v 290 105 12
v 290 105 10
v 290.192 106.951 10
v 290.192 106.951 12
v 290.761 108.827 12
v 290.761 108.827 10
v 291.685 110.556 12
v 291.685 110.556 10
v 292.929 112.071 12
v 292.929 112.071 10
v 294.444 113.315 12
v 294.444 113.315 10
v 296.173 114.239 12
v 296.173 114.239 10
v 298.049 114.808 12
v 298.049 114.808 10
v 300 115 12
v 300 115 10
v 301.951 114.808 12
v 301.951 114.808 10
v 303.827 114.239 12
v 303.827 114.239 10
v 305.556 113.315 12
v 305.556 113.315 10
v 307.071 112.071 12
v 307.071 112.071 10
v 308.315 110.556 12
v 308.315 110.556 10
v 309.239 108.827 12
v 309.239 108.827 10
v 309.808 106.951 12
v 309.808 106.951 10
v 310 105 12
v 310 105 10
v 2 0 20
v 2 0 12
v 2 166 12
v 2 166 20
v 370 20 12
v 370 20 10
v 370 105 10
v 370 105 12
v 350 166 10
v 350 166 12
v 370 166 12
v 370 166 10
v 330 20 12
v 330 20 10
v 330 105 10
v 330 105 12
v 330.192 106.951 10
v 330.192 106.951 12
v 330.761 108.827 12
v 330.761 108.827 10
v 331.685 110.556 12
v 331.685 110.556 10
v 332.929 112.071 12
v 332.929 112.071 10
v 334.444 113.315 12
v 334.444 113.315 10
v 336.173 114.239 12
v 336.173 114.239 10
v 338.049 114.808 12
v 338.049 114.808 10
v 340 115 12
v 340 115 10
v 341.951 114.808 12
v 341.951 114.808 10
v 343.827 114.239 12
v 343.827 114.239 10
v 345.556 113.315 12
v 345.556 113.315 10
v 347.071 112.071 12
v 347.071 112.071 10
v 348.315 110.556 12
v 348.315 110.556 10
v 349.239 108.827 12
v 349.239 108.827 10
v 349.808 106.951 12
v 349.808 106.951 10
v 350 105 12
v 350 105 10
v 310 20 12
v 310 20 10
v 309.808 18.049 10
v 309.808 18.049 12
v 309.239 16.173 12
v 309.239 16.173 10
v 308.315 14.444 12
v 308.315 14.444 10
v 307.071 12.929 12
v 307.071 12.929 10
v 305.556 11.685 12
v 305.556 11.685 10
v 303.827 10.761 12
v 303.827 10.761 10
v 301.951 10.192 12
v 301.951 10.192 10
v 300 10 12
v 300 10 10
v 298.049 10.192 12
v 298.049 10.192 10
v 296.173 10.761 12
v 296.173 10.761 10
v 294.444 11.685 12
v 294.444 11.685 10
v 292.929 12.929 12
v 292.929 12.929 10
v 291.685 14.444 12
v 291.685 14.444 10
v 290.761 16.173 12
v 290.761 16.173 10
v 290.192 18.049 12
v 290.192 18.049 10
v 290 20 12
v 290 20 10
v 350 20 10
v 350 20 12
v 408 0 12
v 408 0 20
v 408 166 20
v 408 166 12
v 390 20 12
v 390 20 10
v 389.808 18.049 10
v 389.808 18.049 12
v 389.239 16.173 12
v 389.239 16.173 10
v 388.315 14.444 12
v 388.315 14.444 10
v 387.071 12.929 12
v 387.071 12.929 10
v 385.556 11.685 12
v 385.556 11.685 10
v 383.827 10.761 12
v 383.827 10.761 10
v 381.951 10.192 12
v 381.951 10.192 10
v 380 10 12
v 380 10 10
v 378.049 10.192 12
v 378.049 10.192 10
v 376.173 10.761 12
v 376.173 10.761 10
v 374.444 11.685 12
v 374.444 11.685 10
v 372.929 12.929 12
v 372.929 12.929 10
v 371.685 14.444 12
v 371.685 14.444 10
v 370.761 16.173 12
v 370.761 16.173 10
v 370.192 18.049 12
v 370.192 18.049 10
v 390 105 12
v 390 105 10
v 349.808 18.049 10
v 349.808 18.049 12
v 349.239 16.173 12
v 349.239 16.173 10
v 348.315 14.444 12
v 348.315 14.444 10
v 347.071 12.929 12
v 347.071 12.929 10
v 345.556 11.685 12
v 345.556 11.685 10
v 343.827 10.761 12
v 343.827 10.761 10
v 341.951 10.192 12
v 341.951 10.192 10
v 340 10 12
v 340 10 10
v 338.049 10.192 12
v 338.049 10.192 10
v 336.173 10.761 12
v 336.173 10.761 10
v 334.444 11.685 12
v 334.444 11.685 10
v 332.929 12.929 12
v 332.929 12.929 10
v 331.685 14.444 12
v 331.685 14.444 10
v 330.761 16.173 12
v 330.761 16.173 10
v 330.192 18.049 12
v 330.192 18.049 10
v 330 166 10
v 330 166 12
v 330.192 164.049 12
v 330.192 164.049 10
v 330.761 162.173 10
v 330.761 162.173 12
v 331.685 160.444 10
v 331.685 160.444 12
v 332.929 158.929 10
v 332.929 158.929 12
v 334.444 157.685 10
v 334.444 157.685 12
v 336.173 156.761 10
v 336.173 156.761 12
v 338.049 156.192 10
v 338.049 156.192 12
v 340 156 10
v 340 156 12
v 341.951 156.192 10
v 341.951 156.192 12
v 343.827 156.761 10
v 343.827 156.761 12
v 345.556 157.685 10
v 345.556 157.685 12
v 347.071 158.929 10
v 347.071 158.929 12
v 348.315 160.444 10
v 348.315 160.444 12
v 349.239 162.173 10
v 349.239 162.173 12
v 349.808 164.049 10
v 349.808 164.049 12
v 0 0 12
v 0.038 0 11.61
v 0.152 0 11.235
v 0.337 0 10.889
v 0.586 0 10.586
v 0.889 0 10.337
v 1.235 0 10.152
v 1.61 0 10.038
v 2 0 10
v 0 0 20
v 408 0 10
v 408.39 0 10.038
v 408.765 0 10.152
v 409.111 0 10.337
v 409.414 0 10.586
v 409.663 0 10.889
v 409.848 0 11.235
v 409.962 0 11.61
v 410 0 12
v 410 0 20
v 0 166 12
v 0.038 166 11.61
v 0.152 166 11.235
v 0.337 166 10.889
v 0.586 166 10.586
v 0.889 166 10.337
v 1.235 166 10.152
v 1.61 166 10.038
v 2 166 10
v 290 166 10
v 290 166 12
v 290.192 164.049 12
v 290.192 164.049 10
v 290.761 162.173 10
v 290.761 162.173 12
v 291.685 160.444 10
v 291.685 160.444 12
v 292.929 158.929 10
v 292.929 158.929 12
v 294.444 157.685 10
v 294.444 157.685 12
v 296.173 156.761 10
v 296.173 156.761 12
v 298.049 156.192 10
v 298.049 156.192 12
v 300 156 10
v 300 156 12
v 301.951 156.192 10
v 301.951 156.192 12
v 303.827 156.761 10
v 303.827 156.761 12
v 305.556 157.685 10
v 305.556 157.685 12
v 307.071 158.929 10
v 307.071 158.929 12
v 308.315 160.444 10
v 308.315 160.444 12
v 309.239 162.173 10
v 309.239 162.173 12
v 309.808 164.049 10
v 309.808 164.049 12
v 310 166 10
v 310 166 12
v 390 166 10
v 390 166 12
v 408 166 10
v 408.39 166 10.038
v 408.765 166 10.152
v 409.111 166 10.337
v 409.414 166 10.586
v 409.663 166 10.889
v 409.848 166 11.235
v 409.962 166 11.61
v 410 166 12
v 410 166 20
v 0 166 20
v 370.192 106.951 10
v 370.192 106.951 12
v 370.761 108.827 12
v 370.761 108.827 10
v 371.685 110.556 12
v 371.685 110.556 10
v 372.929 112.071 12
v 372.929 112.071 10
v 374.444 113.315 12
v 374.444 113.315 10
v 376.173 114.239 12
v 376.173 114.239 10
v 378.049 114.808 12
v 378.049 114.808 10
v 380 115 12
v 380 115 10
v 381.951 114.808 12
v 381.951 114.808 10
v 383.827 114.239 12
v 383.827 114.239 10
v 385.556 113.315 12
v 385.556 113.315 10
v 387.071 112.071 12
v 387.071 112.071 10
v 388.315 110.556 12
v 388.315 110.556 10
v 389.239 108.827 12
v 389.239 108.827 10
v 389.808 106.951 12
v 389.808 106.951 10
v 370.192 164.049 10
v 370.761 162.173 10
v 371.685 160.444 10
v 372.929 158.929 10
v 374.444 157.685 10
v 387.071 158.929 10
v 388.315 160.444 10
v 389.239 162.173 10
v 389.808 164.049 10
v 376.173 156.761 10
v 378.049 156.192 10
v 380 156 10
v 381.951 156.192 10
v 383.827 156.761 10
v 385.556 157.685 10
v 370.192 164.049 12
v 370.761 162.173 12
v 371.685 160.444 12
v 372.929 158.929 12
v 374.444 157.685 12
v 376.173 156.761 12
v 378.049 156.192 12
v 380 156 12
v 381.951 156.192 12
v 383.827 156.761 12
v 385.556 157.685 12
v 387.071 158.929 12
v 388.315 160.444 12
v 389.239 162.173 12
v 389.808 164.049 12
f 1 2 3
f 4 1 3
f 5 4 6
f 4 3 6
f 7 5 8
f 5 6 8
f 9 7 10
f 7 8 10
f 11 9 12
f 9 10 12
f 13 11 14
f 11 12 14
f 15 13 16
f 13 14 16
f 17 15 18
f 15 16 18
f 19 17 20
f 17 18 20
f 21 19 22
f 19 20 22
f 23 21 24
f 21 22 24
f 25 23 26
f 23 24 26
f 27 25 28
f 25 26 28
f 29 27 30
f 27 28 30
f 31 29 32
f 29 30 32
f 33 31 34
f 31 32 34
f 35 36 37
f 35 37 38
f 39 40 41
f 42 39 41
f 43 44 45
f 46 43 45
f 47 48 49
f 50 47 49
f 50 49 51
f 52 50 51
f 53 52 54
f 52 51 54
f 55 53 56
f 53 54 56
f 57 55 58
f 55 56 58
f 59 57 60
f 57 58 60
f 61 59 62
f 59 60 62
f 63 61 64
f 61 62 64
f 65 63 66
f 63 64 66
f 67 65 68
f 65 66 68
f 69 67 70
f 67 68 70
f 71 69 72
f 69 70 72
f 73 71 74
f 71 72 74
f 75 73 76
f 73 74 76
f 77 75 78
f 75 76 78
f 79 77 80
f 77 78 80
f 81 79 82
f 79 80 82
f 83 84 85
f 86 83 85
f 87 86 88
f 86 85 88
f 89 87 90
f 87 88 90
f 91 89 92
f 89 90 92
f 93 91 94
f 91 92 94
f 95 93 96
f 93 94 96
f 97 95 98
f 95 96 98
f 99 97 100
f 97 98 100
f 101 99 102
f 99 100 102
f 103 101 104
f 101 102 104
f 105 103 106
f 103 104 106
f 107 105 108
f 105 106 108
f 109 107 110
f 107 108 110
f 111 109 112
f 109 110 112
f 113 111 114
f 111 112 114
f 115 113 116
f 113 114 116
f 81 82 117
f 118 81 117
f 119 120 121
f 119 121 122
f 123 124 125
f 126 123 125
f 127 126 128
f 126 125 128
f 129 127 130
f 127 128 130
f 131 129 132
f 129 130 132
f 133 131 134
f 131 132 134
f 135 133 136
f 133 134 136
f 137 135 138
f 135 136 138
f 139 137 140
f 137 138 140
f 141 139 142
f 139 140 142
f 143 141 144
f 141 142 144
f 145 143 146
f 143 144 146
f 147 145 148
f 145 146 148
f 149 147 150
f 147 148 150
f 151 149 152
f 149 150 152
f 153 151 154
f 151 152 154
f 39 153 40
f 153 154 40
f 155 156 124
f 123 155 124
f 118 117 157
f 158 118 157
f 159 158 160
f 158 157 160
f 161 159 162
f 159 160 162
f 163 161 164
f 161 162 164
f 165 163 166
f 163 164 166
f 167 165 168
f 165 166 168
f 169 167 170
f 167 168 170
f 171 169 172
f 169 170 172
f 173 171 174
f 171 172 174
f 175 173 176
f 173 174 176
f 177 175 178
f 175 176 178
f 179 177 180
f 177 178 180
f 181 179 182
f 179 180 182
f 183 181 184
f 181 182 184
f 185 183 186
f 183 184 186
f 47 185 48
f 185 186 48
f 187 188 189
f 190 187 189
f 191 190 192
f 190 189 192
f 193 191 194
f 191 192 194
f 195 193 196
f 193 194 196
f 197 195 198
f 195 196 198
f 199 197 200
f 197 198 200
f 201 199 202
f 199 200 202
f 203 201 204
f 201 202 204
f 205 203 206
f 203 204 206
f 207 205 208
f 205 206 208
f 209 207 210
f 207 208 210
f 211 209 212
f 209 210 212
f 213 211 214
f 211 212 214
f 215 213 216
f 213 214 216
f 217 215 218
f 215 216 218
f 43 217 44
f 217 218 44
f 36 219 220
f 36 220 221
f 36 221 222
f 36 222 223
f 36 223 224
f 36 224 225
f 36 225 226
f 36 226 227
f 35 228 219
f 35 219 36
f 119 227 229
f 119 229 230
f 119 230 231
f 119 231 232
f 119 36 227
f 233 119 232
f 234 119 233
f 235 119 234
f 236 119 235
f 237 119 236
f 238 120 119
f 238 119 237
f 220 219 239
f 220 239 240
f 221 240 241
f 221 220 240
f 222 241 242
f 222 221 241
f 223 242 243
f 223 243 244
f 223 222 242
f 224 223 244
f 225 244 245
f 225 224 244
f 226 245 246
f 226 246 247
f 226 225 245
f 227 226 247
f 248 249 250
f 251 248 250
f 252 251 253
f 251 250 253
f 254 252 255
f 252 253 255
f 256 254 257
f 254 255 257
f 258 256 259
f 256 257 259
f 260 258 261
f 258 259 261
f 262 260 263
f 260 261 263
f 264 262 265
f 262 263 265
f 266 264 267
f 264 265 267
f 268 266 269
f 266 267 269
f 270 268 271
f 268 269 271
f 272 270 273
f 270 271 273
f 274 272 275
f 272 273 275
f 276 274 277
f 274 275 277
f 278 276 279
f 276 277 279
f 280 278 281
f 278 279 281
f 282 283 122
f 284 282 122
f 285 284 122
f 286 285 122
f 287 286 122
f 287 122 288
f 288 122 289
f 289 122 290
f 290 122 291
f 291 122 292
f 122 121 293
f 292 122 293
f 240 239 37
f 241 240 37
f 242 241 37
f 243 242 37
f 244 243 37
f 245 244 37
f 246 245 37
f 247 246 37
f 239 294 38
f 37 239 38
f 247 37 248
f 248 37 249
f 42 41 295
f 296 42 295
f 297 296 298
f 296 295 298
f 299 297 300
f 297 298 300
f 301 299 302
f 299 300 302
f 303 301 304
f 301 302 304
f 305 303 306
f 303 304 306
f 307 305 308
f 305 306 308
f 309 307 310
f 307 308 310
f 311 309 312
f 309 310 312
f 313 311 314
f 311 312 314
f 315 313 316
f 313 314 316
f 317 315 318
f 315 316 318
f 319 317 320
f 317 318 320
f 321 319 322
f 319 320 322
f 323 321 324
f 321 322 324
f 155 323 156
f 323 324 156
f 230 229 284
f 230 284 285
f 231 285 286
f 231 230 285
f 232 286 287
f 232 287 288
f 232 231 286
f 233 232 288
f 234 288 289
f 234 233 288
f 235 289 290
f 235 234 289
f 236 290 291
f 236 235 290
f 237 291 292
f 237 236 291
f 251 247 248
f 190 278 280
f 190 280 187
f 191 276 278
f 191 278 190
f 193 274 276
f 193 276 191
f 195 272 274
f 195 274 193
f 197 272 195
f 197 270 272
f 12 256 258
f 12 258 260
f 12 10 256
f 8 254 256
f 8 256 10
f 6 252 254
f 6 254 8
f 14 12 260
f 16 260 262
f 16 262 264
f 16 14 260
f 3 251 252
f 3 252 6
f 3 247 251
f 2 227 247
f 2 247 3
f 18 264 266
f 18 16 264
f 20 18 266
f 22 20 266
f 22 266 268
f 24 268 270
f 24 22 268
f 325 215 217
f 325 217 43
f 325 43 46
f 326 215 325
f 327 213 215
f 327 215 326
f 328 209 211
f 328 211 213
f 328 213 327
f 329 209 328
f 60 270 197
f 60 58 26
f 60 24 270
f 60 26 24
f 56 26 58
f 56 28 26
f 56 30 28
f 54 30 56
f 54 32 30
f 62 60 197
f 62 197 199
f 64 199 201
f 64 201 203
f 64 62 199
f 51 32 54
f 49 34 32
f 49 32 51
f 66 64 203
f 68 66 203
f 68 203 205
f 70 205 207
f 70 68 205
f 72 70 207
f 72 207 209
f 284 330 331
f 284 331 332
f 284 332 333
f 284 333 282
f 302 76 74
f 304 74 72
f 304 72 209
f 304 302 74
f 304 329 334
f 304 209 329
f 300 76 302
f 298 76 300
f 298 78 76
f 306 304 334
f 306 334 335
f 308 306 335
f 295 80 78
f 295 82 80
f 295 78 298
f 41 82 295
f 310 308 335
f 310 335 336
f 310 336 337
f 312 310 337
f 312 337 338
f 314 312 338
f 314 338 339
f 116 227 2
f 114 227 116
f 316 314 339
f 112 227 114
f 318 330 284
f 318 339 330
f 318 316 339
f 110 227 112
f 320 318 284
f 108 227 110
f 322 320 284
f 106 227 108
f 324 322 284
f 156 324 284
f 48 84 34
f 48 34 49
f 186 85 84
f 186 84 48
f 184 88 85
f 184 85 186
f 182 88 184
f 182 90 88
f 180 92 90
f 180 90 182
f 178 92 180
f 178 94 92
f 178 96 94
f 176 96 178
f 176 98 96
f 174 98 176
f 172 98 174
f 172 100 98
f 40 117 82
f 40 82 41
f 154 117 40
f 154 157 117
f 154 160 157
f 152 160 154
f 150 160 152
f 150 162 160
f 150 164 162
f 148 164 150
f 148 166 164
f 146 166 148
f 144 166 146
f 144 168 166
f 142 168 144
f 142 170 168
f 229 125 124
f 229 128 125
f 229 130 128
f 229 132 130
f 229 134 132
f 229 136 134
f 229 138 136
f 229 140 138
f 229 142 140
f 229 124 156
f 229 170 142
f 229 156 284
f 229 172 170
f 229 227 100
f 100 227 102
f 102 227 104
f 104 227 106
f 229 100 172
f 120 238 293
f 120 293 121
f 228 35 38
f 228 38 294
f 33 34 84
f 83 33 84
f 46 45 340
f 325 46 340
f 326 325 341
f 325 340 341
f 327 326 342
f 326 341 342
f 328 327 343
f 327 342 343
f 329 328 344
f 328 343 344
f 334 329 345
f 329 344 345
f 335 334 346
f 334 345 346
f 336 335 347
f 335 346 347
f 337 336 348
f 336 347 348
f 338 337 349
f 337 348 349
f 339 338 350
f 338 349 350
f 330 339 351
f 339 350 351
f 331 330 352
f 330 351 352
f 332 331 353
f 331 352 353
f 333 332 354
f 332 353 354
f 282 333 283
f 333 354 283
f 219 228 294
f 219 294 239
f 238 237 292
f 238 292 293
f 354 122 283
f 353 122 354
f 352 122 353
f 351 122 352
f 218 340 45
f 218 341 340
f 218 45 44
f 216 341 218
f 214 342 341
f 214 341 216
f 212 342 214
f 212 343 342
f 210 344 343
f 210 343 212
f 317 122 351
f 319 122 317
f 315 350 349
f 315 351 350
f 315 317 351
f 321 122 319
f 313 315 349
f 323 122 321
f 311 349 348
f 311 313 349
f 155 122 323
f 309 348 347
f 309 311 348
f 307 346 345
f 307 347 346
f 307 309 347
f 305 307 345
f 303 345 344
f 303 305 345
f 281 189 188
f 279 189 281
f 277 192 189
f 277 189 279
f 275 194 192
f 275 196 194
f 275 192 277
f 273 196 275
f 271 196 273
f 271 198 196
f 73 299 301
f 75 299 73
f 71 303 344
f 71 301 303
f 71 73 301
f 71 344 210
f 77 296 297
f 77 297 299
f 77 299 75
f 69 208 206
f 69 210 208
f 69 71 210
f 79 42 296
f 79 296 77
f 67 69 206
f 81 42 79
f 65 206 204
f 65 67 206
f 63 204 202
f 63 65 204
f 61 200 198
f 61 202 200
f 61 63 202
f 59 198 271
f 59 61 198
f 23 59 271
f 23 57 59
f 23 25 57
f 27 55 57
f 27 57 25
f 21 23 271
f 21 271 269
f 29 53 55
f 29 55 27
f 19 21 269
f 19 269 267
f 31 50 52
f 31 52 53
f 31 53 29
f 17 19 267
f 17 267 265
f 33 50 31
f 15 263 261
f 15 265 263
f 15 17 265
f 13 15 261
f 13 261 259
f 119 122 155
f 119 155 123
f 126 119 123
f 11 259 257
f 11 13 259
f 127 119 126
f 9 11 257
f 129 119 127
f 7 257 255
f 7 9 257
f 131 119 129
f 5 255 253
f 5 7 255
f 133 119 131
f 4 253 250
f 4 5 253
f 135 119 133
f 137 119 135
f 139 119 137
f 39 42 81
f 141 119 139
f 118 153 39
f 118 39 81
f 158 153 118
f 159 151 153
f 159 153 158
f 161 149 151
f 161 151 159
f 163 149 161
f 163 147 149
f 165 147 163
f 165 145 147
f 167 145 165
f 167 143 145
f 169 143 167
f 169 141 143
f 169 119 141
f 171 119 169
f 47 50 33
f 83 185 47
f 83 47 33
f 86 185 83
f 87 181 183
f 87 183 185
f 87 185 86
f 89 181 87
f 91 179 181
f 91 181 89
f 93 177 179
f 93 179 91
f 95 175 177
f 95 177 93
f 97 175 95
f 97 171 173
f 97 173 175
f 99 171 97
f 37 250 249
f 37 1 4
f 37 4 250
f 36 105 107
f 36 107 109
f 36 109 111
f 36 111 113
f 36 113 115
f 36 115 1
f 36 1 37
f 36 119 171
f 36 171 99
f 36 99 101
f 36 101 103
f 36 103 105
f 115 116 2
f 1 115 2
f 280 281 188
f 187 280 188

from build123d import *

# Parameters (mm, degrees)
F1_DEPTH = 166
F3_DEPTH = 2
F4_D     = 20
F4_DEPTH = 5


with BuildPart() as f1:
    # F0 (on Front) → F1 (new body)
    with BuildSketch(Plane.XZ):
        with BuildLine():
            ThreePointArc((0, 12), (0.585786, 10.585786), (2, 10))
            Line((2, 10), (408, 10))
            ThreePointArc((408, 10), (409.414214, 10.585786), (410, 12))
            Line((410, 12), (410, 20))
            Line((410, 20), (408, 20))
            Line((408, 20), (408, 12))
            Line((408, 12), (2, 12))
            Line((2, 12), (2, 20))
            Line((2, 20), (0, 20))
            Line((0, 20), (0, 12))
        make_face()
    extrude(amount=-F1_DEPTH)

    # F2 (on face) → F3 (cut, through all)
    with BuildSketch(Plane(origin=(0, 0, 10), x_dir=(1, 0, 0), z_dir=(0, 0, -1))):
        with BuildLine():
            ThreePointArc((310, -20), (300, -10), (290, -20))
            Line((290, -20), (290, -105))
            ThreePointArc((290, -105), (300, -115), (310, -105))
            Line((310, -105), (310, -20))
        make_face()
        with BuildLine():
            ThreePointArc((350, -20), (340, -10), (330, -20))
            Line((330, -20), (330, -105))
            ThreePointArc((330, -105), (340, -115), (350, -105))
            Line((350, -105), (350, -20))
        make_face()
        with BuildLine():
            ThreePointArc((390, -20), (380, -10), (370, -20))
            Line((370, -20), (370, -105))
            ThreePointArc((370, -105), (380, -115), (390, -105))
            Line((390, -105), (390, -20))
        make_face()
    extrude(amount=-F3_DEPTH, mode=Mode.SUBTRACT)

    # F4
    with Locations(Plane(origin=(0, 0, 10), x_dir=(1, 0, 0), z_dir=(0, 0, -1))):
        with Locations((300, -166), (340, -166), (380, -166)):
            Hole(F4_D / 2, depth=F4_DEPTH)


solid = f1.part
